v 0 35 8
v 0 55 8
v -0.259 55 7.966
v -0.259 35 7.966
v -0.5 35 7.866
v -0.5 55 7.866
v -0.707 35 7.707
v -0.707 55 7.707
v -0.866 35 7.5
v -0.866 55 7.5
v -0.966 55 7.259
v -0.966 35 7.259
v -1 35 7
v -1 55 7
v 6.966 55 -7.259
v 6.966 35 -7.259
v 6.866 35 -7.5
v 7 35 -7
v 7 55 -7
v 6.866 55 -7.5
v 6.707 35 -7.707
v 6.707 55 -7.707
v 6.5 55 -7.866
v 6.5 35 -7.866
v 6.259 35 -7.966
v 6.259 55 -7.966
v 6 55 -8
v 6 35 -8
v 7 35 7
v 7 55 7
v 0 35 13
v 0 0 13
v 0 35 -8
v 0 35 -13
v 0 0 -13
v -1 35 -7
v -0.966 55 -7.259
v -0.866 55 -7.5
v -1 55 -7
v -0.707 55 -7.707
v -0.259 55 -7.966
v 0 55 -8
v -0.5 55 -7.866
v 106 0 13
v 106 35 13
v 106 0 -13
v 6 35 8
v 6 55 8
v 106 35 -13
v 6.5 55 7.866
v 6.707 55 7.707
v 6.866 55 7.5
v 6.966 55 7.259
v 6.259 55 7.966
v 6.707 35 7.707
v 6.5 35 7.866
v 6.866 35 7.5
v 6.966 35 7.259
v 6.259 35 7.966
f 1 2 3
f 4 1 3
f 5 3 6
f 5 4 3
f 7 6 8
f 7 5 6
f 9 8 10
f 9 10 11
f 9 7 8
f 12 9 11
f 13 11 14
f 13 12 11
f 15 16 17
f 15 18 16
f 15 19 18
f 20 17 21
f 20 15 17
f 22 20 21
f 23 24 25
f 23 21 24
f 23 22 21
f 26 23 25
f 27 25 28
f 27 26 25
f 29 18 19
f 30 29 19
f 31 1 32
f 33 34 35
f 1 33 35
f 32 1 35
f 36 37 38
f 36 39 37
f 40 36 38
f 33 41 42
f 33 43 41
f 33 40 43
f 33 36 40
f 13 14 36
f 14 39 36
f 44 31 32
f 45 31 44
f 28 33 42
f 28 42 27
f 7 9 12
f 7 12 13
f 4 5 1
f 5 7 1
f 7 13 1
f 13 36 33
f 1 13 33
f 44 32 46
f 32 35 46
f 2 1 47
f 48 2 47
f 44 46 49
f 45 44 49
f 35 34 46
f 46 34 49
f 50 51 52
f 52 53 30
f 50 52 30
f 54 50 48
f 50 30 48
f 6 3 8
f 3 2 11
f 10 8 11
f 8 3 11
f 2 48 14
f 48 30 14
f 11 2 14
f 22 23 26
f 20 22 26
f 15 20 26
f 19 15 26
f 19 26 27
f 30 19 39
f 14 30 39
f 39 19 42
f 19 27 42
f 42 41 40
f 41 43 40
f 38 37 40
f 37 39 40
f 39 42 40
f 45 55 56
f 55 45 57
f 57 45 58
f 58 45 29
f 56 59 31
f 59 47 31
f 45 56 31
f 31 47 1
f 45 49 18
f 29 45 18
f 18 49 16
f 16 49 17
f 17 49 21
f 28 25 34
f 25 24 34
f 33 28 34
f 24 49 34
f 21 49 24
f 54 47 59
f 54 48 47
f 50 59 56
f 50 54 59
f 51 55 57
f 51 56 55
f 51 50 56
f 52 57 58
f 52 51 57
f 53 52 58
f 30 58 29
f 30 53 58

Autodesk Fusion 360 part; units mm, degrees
sketch "Sketch1" plane through (0, 0, 0) normal (0, 0, 1) x (1, 0, 0)
  line L0 (0, 0) -> (106, 0)
  line L1 (106, 0) -> (106, 35)
  line L2 (106, 35) -> (0, 35)
  line L3 (0, 35) -> (0, 0)
  line L4 (-1, 35) -> (7, 35)
  line L5 (7, 35) -> (7, 55)
  line L6 (7, 55) -> (-1, 55)
  line L7 (-1, 55) -> (-1, 35)
  dimension "d1" = 106
  dimension "d2" = 35
  dimension "d3" = 8
  dimension "d4" = 20
  dimension "d5" = 1
extrude "Extrude1" add sketch "Sketch1" along normal mid plane 26 contours L0 L1 L2 L3 L4
extrude "Extrude2" add sketch "Sketch1" along normal mid plane 16 contours L2 L4 L5 L6 L7
fillet "Fillet1" radius 1 4 edges at (7, 45, 8) (-1, 45, 8) (-1, 45, -8) (7, 45, -8)
